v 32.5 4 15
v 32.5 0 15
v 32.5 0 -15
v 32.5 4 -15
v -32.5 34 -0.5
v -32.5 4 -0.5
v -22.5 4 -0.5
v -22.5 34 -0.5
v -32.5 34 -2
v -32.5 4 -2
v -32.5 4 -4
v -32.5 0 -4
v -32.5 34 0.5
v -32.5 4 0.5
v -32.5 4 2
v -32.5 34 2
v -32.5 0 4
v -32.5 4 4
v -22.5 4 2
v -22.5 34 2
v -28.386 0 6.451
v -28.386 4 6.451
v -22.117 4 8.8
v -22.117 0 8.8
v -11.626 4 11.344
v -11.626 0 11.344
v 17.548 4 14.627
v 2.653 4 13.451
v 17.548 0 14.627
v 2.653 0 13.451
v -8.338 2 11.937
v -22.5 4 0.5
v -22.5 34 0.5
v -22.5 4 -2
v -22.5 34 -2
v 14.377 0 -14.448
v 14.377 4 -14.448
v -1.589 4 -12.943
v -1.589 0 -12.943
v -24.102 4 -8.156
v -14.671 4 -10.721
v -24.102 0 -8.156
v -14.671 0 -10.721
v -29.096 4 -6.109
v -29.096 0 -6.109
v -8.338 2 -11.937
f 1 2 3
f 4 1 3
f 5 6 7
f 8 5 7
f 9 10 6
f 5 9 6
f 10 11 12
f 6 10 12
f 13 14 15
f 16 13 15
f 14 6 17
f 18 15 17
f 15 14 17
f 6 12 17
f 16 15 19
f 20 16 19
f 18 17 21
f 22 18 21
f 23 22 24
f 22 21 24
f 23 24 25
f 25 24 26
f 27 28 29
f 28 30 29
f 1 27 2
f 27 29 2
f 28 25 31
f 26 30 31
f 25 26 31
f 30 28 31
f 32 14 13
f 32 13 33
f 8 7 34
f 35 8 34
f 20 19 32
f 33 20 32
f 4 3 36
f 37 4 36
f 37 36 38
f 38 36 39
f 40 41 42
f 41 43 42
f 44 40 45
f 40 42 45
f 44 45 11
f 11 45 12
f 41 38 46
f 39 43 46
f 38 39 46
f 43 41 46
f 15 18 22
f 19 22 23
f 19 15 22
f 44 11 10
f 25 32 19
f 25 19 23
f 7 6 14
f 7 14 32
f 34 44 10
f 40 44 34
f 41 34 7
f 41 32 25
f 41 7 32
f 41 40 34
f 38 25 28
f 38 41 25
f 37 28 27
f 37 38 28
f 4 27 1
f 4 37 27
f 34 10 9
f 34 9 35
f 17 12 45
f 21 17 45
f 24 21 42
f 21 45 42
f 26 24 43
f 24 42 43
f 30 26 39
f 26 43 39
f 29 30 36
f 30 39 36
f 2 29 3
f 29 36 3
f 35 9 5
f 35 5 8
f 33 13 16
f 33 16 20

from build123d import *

# Parameters (mm, degrees)
BOSS_EXTRUDE1_DEPTH = 4
SKETCH2_W           = 10
SKETCH2_H           = 1.5
BOSS_EXTRUDE3_DEPTH = 30


with BuildPart() as part:
    # Sketch1 → Boss-Extrude1 (new body)
    with BuildSketch(Plane(origin=(0, 0, 0), x_dir=(1, 0, 0), z_dir=(0, 1, 0))):
        with BuildLine():
            Line((32.5, -15), (32.5, 15))
            add(Edge.make_bspline(
                [(32.5, 15), (-18.815789474, 15), (-32.5, 4)],
                knots=[1.570796327, 1.570796327, 1.570796327, 2.871659858, 2.871659858, 2.871659858], degree=2, weights=[1, 0.795822426, 1]))
            Line((-32.5, 4), (-32.5, -4))
            add(Edge.make_bspline(
                [(-32.5, -4), (-18.815789474, -15), (32.5, -15)],
                knots=[3.411525449, 3.411525449, 3.411525449, 4.71238898, 4.71238898, 4.71238898], degree=2, weights=[1, 0.795822426, 1]))
        make_face()
    extrude(amount=BOSS_EXTRUDE1_DEPTH)

    # Sketch2 → Boss-Extrude3 (add)
    with BuildSketch(Plane(origin=(0, 4, 0), x_dir=(1, 0, 0), z_dir=(0, 1, 0))):
        with Locations((-27.5, -1.25)):
            Rectangle(SKETCH2_W, SKETCH2_H)
        with Locations((-27.5, 1.25)):
            Rectangle(SKETCH2_W, SKETCH2_H)
    extrude(amount=BOSS_EXTRUDE3_DEPTH)


solid = part.part
